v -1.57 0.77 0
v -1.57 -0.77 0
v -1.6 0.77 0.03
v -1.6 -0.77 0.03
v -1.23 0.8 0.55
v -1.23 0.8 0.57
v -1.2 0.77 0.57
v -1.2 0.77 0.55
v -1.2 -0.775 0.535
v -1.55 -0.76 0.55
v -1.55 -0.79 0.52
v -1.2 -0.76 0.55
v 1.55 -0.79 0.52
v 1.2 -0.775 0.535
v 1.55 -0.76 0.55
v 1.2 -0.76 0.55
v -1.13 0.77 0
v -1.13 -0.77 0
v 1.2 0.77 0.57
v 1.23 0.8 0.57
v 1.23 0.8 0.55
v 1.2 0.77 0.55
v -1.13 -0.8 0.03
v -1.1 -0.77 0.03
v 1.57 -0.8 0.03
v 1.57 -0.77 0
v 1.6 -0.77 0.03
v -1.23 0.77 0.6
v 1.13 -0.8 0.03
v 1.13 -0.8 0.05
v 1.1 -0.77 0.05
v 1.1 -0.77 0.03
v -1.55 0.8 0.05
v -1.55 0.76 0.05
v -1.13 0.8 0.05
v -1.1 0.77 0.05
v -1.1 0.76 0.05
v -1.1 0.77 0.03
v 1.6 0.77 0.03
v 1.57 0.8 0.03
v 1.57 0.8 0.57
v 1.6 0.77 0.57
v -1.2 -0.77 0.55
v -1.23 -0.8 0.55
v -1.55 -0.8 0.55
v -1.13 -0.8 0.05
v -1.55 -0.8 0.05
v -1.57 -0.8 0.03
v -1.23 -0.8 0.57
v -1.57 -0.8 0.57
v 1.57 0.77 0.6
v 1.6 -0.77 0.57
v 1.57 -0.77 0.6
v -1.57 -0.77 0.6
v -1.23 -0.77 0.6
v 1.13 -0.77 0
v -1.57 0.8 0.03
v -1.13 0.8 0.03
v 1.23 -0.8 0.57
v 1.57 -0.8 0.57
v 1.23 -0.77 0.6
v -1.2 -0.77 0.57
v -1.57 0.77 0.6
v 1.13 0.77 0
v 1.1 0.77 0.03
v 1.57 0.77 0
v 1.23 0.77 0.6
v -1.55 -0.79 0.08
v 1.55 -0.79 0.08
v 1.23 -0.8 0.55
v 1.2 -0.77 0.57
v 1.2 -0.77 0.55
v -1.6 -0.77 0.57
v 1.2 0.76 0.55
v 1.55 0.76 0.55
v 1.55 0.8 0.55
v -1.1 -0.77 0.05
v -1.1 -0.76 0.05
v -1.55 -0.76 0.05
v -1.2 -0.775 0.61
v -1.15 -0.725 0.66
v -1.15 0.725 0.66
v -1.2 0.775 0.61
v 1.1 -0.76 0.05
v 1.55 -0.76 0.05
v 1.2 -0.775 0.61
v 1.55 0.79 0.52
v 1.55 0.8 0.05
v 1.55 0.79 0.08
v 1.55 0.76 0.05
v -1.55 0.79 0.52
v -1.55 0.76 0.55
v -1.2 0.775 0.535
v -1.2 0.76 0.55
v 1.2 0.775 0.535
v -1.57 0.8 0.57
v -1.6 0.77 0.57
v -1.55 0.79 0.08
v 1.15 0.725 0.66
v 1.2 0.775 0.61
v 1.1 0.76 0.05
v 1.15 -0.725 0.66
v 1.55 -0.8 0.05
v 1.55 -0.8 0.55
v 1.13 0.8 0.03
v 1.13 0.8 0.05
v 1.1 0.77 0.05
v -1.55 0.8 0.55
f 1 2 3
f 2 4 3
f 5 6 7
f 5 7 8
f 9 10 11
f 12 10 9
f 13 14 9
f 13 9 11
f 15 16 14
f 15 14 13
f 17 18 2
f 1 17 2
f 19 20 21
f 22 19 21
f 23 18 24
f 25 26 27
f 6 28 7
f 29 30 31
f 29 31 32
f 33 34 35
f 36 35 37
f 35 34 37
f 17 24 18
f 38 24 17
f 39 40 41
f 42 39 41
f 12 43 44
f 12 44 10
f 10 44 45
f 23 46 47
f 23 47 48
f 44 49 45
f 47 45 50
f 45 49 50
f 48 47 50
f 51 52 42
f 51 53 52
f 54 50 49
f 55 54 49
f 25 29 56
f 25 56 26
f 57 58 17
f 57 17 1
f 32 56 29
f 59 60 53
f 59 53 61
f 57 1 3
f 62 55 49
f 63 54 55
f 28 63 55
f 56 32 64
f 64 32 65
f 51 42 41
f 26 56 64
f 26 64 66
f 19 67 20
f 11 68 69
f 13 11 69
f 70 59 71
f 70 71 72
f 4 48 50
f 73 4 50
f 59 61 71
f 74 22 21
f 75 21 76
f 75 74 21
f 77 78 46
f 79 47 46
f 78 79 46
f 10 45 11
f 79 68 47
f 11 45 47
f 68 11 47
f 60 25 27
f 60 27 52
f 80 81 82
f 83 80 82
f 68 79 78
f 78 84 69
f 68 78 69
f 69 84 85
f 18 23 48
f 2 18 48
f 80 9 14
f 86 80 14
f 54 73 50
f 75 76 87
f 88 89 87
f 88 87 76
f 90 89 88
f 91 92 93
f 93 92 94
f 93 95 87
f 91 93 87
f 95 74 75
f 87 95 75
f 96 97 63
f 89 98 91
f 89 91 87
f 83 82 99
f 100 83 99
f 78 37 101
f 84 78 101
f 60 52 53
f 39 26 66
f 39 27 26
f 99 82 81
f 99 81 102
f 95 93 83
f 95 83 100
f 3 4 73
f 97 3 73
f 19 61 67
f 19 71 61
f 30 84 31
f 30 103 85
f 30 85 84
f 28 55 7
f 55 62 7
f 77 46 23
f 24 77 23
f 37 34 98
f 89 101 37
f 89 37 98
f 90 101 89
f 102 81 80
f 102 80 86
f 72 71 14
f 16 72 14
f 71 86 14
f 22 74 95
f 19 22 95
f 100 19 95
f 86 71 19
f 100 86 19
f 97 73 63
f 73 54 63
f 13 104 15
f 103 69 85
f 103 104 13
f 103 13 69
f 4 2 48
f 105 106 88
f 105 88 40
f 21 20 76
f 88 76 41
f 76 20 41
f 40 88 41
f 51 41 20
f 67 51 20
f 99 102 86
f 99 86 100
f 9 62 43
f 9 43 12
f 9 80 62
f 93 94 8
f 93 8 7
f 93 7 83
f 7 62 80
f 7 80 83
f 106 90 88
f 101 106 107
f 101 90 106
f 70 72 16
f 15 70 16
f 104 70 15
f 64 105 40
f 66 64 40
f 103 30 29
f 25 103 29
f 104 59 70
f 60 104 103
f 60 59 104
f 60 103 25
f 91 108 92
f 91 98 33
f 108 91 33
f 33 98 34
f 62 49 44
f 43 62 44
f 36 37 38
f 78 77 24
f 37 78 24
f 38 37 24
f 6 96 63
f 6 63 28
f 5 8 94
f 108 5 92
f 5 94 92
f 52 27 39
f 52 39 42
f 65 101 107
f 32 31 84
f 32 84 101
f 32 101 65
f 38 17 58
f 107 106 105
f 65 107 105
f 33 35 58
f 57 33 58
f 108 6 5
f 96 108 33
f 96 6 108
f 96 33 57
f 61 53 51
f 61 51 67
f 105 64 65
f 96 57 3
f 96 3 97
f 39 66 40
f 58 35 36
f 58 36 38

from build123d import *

# Parameters (mm, degrees)
EXTRUDE_DEPTH                  = 1.6
EXTRUDE_ONTO_SKETCH_ROLL_ANGLE = 90
CHAMFER001_SIZE                = 0.03
BOX_W                          = 3.1
BOX_H                          = 1.58
BOX_DEPTH                      = 0.5
CHAMFER_SIZE                   = 0.03
BOX001_W                       = 2.4
BOX001_H                       = 1.55
BOX001_DEPTH                   = 0.15
CHAMFER002_SIZE                = 0.05


with BuildPart() as chamferpads:
    # Sketch as drawn → Extrude (new)
    with BuildSketch(Plane.XY):
        Polygon((-1.1, 0), (-1.6, 0), (-1.6, 0.6), (-1.2, 0.6), (-1.2, 0.55), (-1.55, 0.55), (-1.55, 0.05), (-1.1, 0.05), align=None)
    extrude(amount=-EXTRUDE_DEPTH)


with BuildPart() as chamferpads_1:
    # Extrude onto Sketch roll: moved
    add(chamferpads.part.rotate(Axis((0, 0, 0), (1, 0, 0)), EXTRUDE_ONTO_SKETCH_ROLL_ANGLE))


with BuildPart() as chamferpads_2:
    # Extrude onto Sketch placement: moved
    add(chamferpads_1.part)

    # Chamfer001
    chamfer001_edges = [chamferpads_2.edges().sort_by_distance(p)[0] for p in [
        (-1.1, 0.8, 0),
        (-1.6, 0.8, 0),
        (-1.35, 0, 0),
        (-1.35, 1.6, 0),
        (-1.6, 0.8, 0.6),
        (-1.6, 0, 0.3),
        (-1.6, 1.6, 0.3),
        (-1.2, 0.8, 0.6),
        (-1.4, 0, 0.6),
        (-1.4, 1.6, 0.6),
        (-1.2, 0, 0.575),
        (-1.2, 1.6, 0.575),
        (-1.1, 0, 0.025),
        (-1.1, 1.6, 0.025),
    ]]
    chamfer(chamfer001_edges, length=CHAMFER001_SIZE)


with BuildPart() as part_mirroring:
    # Part__Mirroring: instance of ChamferPads
    add(chamferpads_2.part.mirror(Plane(origin=(0, 0, 0), x_dir=(0, -1, 0), z_dir=(1, 0, 0))))


with BuildPart() as chamferbody:
    # Box → Box (new body)
    with BuildSketch(Plane(origin=(-1.55, 0.01, 0.05), x_dir=(1, 0, 0), z_dir=(0, 0, 1))):
        with Locations((1.55, 0.79)):
            Rectangle(BOX_W, BOX_H)
    extrude(amount=BOX_DEPTH)

    # Chamfer
    chamfer_edges = [chamferbody.edges().sort_by_distance(p)[0] for p in [
        (0, 0.01, 0.05),
        (0, 0.01, 0.55),
        (0, 1.59, 0.05),
        (0, 1.59, 0.55),
    ]]
    chamfer(chamfer_edges, length=CHAMFER_SIZE)


with BuildPart() as fusion:
    # Box001 → Box001 (new body)
    with BuildSketch(Plane(origin=(-1.2, 0.025, 0.51), x_dir=(1, 0, 0), z_dir=(0, 0, 1))):
        with Locations((1.2, 0.775)):
            Rectangle(BOX001_W, BOX001_H)
    extrude(amount=BOX001_DEPTH)

    # Chamfer002
    chamfer002_edges = [fusion.edges().sort_by_distance(p)[0] for p in [
        (-1.2, 0.8, 0.66),
        (1.2, 0.8, 0.66),
        (0, 0.025, 0.66),
        (0, 1.575, 0.66),
    ]]
    chamfer(chamfer002_edges, length=CHAMFER002_SIZE)

    # Fusion: union ChamferPads, Part__Mirroring, ChamferBody
    add(chamferpads_2.part)
    add(part_mirroring.part)
    add(chamferbody.part)


with BuildPart() as fusion_1:
    # Fusion placement: moved
    add(fusion.part.moved(Location((0, -0.8, 0))))


solid = fusion_1.part
